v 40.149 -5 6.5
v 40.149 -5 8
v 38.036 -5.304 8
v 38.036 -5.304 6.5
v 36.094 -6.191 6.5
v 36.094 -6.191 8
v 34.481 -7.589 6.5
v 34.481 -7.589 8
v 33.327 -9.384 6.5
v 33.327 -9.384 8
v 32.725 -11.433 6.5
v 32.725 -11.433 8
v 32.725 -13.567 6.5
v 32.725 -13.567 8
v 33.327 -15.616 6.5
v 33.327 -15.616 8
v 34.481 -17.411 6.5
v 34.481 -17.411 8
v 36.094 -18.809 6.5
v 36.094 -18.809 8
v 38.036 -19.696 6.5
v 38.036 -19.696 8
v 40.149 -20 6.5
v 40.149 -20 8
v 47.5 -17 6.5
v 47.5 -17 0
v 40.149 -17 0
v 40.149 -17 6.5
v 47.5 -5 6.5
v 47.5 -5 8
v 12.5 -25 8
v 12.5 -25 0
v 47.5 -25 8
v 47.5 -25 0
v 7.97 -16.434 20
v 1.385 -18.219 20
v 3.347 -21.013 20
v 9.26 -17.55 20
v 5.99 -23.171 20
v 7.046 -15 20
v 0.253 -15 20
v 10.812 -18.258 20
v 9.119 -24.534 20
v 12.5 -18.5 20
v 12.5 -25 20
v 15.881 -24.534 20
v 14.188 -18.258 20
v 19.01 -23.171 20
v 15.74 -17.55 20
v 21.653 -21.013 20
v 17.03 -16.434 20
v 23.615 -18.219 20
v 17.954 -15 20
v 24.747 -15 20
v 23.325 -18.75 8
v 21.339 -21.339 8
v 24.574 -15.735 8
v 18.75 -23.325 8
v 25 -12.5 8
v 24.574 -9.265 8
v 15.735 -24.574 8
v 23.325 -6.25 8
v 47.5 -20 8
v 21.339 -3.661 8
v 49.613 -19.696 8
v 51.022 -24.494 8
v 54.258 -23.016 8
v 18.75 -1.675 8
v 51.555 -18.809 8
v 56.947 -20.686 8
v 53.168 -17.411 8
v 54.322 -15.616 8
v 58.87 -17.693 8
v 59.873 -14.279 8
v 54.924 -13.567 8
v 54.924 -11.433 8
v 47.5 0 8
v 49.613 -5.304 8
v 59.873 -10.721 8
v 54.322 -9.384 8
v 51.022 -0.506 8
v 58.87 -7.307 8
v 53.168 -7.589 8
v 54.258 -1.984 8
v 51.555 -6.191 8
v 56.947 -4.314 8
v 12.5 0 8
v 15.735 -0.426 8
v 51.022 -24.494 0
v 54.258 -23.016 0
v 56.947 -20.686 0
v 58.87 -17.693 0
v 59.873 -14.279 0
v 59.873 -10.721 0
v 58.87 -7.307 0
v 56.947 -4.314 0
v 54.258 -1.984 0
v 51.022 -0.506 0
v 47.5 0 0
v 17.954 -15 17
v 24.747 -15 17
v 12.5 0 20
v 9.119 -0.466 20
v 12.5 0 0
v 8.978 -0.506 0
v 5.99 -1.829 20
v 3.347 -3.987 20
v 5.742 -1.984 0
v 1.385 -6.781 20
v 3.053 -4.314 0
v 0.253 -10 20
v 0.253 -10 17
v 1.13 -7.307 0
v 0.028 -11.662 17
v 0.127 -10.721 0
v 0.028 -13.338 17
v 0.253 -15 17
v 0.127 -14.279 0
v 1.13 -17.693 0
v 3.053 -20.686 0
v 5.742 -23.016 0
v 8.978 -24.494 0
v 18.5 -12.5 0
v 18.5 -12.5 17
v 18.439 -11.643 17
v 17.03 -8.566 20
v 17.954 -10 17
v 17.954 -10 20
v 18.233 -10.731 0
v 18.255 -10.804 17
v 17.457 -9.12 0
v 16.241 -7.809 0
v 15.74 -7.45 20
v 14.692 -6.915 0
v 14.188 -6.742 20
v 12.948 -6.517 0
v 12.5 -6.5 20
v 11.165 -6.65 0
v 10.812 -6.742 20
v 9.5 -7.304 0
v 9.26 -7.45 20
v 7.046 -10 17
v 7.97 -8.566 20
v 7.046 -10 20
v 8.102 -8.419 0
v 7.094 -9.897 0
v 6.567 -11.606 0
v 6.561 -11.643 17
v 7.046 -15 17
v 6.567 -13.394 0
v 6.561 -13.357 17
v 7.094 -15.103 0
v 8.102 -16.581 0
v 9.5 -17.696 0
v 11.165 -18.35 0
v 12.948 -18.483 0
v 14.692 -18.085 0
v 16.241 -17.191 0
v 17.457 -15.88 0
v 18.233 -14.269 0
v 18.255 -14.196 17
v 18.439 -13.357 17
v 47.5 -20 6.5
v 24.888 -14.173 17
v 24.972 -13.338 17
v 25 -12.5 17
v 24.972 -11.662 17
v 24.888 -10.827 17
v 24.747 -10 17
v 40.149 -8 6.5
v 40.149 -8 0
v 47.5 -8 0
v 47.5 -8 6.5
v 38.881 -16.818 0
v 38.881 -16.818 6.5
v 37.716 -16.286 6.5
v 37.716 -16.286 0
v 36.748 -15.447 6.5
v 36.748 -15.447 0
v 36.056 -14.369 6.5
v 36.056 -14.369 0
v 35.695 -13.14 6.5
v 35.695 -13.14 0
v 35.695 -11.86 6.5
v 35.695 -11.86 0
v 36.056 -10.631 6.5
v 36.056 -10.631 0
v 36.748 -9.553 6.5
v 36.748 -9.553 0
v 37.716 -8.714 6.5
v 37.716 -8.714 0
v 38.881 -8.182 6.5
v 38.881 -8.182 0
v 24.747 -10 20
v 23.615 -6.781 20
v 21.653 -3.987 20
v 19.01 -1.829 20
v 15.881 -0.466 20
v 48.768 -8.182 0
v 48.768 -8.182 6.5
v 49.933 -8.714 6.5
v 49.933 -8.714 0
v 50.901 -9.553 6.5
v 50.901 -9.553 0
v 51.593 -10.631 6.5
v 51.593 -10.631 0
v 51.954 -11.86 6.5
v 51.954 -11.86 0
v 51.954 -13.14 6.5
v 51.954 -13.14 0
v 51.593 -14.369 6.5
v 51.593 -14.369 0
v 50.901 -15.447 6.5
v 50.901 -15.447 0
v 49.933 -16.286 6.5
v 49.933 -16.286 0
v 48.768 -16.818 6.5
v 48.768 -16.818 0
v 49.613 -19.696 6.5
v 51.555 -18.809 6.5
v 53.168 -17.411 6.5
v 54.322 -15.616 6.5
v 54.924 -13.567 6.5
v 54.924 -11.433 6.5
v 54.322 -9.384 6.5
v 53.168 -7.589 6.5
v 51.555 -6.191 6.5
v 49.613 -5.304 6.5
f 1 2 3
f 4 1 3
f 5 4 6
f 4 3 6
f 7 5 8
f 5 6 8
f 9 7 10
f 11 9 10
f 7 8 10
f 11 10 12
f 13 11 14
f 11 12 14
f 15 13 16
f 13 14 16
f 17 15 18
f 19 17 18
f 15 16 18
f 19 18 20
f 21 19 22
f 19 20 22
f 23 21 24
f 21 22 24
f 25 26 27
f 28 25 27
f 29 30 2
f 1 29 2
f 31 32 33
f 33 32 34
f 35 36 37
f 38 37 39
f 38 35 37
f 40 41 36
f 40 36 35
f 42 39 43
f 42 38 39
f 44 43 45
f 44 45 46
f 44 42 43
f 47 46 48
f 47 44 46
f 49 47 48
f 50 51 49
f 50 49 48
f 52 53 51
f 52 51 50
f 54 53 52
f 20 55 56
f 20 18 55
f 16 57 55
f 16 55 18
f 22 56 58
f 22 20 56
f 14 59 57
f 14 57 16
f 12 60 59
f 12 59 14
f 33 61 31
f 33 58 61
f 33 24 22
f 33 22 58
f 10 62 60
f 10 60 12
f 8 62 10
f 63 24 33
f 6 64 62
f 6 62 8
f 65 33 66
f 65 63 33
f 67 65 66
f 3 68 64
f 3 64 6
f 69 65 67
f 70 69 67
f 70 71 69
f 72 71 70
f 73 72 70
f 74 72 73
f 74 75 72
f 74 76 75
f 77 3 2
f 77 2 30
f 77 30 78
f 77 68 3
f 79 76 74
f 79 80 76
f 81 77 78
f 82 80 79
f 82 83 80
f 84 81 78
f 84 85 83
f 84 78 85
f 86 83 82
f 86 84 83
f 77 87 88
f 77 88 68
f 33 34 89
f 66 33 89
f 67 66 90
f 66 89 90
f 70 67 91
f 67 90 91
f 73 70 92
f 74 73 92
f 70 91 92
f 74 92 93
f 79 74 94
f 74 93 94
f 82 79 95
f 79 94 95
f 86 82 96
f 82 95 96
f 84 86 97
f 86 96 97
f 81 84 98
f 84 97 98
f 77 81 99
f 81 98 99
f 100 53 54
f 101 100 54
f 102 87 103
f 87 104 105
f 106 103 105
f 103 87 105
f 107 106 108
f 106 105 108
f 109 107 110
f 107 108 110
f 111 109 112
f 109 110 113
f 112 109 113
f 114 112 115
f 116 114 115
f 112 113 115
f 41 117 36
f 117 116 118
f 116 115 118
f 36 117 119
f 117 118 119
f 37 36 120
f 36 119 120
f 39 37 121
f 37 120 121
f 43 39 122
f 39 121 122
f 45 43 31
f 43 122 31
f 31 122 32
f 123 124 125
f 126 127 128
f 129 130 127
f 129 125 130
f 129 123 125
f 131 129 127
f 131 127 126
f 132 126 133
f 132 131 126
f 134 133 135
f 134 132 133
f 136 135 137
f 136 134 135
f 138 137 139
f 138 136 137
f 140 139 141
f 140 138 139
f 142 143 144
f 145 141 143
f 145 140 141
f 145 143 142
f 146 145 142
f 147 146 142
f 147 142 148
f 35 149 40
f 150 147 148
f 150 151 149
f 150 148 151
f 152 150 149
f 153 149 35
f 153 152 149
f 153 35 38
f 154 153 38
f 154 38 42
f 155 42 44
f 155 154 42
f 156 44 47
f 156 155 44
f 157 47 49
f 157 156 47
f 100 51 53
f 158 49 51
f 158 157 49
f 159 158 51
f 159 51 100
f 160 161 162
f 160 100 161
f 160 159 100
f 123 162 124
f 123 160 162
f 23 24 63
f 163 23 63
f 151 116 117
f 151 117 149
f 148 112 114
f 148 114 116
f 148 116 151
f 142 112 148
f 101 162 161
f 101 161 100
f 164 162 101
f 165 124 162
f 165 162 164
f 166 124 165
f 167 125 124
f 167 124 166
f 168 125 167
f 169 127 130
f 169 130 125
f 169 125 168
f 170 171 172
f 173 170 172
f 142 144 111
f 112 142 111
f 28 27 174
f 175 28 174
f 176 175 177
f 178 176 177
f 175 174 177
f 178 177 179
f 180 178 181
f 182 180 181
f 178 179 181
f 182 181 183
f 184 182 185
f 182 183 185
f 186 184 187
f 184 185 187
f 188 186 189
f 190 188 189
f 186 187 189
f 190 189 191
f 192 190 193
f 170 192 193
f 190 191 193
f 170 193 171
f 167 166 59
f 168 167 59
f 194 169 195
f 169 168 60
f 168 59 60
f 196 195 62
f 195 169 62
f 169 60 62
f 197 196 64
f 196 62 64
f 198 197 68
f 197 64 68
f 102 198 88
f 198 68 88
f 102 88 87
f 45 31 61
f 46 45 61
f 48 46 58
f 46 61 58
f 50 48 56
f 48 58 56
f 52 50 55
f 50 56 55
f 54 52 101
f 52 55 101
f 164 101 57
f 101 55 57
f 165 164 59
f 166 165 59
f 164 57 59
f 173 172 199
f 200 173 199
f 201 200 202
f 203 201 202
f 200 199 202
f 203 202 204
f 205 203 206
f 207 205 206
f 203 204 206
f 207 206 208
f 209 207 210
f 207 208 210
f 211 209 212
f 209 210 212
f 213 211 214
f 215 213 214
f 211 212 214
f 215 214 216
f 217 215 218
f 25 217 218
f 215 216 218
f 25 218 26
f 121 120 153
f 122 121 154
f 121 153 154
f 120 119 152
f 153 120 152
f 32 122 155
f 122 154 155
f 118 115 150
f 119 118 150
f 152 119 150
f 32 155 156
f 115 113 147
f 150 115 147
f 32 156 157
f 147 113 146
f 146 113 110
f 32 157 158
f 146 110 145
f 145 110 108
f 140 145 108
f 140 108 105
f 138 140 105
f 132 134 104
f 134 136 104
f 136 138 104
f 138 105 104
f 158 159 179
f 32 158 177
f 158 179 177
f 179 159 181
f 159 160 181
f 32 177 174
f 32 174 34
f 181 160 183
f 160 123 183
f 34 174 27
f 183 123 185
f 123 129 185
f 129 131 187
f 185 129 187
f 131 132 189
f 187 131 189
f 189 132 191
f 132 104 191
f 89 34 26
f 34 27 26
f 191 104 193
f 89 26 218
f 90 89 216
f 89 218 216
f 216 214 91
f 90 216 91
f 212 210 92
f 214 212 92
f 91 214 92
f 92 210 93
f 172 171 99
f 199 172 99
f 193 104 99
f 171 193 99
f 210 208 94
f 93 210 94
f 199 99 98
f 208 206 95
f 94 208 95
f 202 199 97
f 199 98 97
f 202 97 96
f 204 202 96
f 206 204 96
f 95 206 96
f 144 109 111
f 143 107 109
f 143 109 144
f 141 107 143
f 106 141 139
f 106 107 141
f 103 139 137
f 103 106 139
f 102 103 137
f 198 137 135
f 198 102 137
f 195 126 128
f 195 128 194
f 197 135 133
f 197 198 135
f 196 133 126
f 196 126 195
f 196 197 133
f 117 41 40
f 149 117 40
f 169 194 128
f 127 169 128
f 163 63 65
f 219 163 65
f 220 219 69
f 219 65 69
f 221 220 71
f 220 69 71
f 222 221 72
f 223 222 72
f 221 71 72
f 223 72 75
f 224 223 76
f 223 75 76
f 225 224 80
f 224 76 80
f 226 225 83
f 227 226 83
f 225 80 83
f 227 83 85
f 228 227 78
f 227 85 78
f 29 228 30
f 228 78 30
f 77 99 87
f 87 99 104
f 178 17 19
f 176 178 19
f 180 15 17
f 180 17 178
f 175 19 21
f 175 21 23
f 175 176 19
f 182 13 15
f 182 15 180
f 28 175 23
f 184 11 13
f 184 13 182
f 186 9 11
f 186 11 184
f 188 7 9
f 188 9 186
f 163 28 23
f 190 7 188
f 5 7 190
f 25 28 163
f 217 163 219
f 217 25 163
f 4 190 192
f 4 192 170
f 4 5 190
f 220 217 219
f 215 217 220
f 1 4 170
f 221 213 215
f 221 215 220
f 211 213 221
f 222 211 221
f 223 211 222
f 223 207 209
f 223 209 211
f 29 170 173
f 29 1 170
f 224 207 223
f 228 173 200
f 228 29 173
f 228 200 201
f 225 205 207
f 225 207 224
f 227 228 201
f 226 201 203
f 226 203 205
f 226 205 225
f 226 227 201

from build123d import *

# Parameters (mm, degrees)
F0_R     = 6
F1_DEPTH = 8
F3_DEPTH = 1.5
F4_R     = 6
F5_DEPTH = 12
F7_DEPTH = 3


with BuildPart() as f1:
    # F0 (on Top) → F1 (new body)
    with BuildSketch(Plane.XY):
        with BuildLine():
            Line((47.5, 0), (12.5, 0))
            ThreePointArc((12.5, 0), (0, -12.5), (12.5, -25))
            Line((12.5, -25), (47.5, -25))
            ThreePointArc((47.5, -25), (60, -12.5), (47.5, 0))
        make_face()
        with Locations((12.5, -12.5)):
            Circle(F0_R, mode=Mode.SUBTRACT)
        with BuildLine():
            ThreePointArc((47.5, -8), (52, -12.5), (47.5, -17))
            Line((47.5, -17), (40.1489207149, -17))
            ThreePointArc((40.1489207149, -17), (35.6489207149, -12.5), (40.1489207149, -8))
            Line((40.1489207149, -8), (47.5, -8))
        make_face(mode=Mode.SUBTRACT)
    extrude(amount=F1_DEPTH)

    # F2 (on face) → F3 (cut)
    with BuildSketch(Plane.XY.offset(8)):
        with BuildLine():
            Line((40.1489207149, -20), (47.5, -20))
            ThreePointArc((47.5, -20), (55, -12.5), (47.5, -5))
            Line((47.5, -5), (40.1489207149, -5))
            ThreePointArc((40.1489207149, -5), (32.6489207149, -12.5), (40.1489207149, -20))
        make_face()
        with BuildLine():
            Line((47.5, -17), (40.1489207149, -17))
            ThreePointArc((40.1489207149, -17), (35.6489207149, -12.5), (40.1489207149, -8))
            Line((40.1489207149, -8), (47.5, -8))
            ThreePointArc((47.5, -8), (52, -12.5), (47.5, -17))
        make_face(mode=Mode.SUBTRACT)
    extrude(amount=-F3_DEPTH, mode=Mode.SUBTRACT)

    # F4 (on face) → F5 (join)
    with BuildSketch(Plane.XY.offset(8)):
        with BuildLine():
            ThreePointArc((12.5, -25), (21.3388347648, -21.3388347648), (25, -12.5))
            ThreePointArc((25, -12.5), (21.3388347648, -3.6611652352), (12.5, 0))
            ThreePointArc((12.5, 0), (0, -12.5), (12.5, -25))
        make_face()
        with Locations((12.5, -12.5)):
            Circle(F4_R, mode=Mode.SUBTRACT)
    extrude(amount=F5_DEPTH)

    # F6 (on face) → F7 (cut)
    with BuildSketch(Plane.XY.offset(20)):
        with BuildLine():
            Line((17.9543560573, -15), (24.7474487139, -15))
            ThreePointArc((24.7474487139, -15), (24.9367019126, -13.7563620251), (25, -12.5))
            ThreePointArc((25, -12.5), (24.9367019126, -11.2436379749), (24.7474487139, -10))
            Line((24.7474487139, -10), (17.9543560573, -10))
            ThreePointArc((17.9543560573, -10), (18.3620020617, -11.2205736332), (18.5, -12.5))
            ThreePointArc((18.5, -12.5), (18.3620020617, -13.7794263668), (17.9543560573, -15))
        make_face()
        with BuildLine():
            ThreePointArc((0.2525512861, -10), (0, -12.5), (0.2525512861, -15))
            Line((0.2525512861, -15), (7.0456439427, -15))
            ThreePointArc((7.0456439427, -15), (6.5, -12.5), (7.0456439427, -10))
            Line((7.0456439427, -10), (0.2525512861, -10))
        make_face()
    extrude(amount=-F7_DEPTH, mode=Mode.SUBTRACT)


solid = f1.part
